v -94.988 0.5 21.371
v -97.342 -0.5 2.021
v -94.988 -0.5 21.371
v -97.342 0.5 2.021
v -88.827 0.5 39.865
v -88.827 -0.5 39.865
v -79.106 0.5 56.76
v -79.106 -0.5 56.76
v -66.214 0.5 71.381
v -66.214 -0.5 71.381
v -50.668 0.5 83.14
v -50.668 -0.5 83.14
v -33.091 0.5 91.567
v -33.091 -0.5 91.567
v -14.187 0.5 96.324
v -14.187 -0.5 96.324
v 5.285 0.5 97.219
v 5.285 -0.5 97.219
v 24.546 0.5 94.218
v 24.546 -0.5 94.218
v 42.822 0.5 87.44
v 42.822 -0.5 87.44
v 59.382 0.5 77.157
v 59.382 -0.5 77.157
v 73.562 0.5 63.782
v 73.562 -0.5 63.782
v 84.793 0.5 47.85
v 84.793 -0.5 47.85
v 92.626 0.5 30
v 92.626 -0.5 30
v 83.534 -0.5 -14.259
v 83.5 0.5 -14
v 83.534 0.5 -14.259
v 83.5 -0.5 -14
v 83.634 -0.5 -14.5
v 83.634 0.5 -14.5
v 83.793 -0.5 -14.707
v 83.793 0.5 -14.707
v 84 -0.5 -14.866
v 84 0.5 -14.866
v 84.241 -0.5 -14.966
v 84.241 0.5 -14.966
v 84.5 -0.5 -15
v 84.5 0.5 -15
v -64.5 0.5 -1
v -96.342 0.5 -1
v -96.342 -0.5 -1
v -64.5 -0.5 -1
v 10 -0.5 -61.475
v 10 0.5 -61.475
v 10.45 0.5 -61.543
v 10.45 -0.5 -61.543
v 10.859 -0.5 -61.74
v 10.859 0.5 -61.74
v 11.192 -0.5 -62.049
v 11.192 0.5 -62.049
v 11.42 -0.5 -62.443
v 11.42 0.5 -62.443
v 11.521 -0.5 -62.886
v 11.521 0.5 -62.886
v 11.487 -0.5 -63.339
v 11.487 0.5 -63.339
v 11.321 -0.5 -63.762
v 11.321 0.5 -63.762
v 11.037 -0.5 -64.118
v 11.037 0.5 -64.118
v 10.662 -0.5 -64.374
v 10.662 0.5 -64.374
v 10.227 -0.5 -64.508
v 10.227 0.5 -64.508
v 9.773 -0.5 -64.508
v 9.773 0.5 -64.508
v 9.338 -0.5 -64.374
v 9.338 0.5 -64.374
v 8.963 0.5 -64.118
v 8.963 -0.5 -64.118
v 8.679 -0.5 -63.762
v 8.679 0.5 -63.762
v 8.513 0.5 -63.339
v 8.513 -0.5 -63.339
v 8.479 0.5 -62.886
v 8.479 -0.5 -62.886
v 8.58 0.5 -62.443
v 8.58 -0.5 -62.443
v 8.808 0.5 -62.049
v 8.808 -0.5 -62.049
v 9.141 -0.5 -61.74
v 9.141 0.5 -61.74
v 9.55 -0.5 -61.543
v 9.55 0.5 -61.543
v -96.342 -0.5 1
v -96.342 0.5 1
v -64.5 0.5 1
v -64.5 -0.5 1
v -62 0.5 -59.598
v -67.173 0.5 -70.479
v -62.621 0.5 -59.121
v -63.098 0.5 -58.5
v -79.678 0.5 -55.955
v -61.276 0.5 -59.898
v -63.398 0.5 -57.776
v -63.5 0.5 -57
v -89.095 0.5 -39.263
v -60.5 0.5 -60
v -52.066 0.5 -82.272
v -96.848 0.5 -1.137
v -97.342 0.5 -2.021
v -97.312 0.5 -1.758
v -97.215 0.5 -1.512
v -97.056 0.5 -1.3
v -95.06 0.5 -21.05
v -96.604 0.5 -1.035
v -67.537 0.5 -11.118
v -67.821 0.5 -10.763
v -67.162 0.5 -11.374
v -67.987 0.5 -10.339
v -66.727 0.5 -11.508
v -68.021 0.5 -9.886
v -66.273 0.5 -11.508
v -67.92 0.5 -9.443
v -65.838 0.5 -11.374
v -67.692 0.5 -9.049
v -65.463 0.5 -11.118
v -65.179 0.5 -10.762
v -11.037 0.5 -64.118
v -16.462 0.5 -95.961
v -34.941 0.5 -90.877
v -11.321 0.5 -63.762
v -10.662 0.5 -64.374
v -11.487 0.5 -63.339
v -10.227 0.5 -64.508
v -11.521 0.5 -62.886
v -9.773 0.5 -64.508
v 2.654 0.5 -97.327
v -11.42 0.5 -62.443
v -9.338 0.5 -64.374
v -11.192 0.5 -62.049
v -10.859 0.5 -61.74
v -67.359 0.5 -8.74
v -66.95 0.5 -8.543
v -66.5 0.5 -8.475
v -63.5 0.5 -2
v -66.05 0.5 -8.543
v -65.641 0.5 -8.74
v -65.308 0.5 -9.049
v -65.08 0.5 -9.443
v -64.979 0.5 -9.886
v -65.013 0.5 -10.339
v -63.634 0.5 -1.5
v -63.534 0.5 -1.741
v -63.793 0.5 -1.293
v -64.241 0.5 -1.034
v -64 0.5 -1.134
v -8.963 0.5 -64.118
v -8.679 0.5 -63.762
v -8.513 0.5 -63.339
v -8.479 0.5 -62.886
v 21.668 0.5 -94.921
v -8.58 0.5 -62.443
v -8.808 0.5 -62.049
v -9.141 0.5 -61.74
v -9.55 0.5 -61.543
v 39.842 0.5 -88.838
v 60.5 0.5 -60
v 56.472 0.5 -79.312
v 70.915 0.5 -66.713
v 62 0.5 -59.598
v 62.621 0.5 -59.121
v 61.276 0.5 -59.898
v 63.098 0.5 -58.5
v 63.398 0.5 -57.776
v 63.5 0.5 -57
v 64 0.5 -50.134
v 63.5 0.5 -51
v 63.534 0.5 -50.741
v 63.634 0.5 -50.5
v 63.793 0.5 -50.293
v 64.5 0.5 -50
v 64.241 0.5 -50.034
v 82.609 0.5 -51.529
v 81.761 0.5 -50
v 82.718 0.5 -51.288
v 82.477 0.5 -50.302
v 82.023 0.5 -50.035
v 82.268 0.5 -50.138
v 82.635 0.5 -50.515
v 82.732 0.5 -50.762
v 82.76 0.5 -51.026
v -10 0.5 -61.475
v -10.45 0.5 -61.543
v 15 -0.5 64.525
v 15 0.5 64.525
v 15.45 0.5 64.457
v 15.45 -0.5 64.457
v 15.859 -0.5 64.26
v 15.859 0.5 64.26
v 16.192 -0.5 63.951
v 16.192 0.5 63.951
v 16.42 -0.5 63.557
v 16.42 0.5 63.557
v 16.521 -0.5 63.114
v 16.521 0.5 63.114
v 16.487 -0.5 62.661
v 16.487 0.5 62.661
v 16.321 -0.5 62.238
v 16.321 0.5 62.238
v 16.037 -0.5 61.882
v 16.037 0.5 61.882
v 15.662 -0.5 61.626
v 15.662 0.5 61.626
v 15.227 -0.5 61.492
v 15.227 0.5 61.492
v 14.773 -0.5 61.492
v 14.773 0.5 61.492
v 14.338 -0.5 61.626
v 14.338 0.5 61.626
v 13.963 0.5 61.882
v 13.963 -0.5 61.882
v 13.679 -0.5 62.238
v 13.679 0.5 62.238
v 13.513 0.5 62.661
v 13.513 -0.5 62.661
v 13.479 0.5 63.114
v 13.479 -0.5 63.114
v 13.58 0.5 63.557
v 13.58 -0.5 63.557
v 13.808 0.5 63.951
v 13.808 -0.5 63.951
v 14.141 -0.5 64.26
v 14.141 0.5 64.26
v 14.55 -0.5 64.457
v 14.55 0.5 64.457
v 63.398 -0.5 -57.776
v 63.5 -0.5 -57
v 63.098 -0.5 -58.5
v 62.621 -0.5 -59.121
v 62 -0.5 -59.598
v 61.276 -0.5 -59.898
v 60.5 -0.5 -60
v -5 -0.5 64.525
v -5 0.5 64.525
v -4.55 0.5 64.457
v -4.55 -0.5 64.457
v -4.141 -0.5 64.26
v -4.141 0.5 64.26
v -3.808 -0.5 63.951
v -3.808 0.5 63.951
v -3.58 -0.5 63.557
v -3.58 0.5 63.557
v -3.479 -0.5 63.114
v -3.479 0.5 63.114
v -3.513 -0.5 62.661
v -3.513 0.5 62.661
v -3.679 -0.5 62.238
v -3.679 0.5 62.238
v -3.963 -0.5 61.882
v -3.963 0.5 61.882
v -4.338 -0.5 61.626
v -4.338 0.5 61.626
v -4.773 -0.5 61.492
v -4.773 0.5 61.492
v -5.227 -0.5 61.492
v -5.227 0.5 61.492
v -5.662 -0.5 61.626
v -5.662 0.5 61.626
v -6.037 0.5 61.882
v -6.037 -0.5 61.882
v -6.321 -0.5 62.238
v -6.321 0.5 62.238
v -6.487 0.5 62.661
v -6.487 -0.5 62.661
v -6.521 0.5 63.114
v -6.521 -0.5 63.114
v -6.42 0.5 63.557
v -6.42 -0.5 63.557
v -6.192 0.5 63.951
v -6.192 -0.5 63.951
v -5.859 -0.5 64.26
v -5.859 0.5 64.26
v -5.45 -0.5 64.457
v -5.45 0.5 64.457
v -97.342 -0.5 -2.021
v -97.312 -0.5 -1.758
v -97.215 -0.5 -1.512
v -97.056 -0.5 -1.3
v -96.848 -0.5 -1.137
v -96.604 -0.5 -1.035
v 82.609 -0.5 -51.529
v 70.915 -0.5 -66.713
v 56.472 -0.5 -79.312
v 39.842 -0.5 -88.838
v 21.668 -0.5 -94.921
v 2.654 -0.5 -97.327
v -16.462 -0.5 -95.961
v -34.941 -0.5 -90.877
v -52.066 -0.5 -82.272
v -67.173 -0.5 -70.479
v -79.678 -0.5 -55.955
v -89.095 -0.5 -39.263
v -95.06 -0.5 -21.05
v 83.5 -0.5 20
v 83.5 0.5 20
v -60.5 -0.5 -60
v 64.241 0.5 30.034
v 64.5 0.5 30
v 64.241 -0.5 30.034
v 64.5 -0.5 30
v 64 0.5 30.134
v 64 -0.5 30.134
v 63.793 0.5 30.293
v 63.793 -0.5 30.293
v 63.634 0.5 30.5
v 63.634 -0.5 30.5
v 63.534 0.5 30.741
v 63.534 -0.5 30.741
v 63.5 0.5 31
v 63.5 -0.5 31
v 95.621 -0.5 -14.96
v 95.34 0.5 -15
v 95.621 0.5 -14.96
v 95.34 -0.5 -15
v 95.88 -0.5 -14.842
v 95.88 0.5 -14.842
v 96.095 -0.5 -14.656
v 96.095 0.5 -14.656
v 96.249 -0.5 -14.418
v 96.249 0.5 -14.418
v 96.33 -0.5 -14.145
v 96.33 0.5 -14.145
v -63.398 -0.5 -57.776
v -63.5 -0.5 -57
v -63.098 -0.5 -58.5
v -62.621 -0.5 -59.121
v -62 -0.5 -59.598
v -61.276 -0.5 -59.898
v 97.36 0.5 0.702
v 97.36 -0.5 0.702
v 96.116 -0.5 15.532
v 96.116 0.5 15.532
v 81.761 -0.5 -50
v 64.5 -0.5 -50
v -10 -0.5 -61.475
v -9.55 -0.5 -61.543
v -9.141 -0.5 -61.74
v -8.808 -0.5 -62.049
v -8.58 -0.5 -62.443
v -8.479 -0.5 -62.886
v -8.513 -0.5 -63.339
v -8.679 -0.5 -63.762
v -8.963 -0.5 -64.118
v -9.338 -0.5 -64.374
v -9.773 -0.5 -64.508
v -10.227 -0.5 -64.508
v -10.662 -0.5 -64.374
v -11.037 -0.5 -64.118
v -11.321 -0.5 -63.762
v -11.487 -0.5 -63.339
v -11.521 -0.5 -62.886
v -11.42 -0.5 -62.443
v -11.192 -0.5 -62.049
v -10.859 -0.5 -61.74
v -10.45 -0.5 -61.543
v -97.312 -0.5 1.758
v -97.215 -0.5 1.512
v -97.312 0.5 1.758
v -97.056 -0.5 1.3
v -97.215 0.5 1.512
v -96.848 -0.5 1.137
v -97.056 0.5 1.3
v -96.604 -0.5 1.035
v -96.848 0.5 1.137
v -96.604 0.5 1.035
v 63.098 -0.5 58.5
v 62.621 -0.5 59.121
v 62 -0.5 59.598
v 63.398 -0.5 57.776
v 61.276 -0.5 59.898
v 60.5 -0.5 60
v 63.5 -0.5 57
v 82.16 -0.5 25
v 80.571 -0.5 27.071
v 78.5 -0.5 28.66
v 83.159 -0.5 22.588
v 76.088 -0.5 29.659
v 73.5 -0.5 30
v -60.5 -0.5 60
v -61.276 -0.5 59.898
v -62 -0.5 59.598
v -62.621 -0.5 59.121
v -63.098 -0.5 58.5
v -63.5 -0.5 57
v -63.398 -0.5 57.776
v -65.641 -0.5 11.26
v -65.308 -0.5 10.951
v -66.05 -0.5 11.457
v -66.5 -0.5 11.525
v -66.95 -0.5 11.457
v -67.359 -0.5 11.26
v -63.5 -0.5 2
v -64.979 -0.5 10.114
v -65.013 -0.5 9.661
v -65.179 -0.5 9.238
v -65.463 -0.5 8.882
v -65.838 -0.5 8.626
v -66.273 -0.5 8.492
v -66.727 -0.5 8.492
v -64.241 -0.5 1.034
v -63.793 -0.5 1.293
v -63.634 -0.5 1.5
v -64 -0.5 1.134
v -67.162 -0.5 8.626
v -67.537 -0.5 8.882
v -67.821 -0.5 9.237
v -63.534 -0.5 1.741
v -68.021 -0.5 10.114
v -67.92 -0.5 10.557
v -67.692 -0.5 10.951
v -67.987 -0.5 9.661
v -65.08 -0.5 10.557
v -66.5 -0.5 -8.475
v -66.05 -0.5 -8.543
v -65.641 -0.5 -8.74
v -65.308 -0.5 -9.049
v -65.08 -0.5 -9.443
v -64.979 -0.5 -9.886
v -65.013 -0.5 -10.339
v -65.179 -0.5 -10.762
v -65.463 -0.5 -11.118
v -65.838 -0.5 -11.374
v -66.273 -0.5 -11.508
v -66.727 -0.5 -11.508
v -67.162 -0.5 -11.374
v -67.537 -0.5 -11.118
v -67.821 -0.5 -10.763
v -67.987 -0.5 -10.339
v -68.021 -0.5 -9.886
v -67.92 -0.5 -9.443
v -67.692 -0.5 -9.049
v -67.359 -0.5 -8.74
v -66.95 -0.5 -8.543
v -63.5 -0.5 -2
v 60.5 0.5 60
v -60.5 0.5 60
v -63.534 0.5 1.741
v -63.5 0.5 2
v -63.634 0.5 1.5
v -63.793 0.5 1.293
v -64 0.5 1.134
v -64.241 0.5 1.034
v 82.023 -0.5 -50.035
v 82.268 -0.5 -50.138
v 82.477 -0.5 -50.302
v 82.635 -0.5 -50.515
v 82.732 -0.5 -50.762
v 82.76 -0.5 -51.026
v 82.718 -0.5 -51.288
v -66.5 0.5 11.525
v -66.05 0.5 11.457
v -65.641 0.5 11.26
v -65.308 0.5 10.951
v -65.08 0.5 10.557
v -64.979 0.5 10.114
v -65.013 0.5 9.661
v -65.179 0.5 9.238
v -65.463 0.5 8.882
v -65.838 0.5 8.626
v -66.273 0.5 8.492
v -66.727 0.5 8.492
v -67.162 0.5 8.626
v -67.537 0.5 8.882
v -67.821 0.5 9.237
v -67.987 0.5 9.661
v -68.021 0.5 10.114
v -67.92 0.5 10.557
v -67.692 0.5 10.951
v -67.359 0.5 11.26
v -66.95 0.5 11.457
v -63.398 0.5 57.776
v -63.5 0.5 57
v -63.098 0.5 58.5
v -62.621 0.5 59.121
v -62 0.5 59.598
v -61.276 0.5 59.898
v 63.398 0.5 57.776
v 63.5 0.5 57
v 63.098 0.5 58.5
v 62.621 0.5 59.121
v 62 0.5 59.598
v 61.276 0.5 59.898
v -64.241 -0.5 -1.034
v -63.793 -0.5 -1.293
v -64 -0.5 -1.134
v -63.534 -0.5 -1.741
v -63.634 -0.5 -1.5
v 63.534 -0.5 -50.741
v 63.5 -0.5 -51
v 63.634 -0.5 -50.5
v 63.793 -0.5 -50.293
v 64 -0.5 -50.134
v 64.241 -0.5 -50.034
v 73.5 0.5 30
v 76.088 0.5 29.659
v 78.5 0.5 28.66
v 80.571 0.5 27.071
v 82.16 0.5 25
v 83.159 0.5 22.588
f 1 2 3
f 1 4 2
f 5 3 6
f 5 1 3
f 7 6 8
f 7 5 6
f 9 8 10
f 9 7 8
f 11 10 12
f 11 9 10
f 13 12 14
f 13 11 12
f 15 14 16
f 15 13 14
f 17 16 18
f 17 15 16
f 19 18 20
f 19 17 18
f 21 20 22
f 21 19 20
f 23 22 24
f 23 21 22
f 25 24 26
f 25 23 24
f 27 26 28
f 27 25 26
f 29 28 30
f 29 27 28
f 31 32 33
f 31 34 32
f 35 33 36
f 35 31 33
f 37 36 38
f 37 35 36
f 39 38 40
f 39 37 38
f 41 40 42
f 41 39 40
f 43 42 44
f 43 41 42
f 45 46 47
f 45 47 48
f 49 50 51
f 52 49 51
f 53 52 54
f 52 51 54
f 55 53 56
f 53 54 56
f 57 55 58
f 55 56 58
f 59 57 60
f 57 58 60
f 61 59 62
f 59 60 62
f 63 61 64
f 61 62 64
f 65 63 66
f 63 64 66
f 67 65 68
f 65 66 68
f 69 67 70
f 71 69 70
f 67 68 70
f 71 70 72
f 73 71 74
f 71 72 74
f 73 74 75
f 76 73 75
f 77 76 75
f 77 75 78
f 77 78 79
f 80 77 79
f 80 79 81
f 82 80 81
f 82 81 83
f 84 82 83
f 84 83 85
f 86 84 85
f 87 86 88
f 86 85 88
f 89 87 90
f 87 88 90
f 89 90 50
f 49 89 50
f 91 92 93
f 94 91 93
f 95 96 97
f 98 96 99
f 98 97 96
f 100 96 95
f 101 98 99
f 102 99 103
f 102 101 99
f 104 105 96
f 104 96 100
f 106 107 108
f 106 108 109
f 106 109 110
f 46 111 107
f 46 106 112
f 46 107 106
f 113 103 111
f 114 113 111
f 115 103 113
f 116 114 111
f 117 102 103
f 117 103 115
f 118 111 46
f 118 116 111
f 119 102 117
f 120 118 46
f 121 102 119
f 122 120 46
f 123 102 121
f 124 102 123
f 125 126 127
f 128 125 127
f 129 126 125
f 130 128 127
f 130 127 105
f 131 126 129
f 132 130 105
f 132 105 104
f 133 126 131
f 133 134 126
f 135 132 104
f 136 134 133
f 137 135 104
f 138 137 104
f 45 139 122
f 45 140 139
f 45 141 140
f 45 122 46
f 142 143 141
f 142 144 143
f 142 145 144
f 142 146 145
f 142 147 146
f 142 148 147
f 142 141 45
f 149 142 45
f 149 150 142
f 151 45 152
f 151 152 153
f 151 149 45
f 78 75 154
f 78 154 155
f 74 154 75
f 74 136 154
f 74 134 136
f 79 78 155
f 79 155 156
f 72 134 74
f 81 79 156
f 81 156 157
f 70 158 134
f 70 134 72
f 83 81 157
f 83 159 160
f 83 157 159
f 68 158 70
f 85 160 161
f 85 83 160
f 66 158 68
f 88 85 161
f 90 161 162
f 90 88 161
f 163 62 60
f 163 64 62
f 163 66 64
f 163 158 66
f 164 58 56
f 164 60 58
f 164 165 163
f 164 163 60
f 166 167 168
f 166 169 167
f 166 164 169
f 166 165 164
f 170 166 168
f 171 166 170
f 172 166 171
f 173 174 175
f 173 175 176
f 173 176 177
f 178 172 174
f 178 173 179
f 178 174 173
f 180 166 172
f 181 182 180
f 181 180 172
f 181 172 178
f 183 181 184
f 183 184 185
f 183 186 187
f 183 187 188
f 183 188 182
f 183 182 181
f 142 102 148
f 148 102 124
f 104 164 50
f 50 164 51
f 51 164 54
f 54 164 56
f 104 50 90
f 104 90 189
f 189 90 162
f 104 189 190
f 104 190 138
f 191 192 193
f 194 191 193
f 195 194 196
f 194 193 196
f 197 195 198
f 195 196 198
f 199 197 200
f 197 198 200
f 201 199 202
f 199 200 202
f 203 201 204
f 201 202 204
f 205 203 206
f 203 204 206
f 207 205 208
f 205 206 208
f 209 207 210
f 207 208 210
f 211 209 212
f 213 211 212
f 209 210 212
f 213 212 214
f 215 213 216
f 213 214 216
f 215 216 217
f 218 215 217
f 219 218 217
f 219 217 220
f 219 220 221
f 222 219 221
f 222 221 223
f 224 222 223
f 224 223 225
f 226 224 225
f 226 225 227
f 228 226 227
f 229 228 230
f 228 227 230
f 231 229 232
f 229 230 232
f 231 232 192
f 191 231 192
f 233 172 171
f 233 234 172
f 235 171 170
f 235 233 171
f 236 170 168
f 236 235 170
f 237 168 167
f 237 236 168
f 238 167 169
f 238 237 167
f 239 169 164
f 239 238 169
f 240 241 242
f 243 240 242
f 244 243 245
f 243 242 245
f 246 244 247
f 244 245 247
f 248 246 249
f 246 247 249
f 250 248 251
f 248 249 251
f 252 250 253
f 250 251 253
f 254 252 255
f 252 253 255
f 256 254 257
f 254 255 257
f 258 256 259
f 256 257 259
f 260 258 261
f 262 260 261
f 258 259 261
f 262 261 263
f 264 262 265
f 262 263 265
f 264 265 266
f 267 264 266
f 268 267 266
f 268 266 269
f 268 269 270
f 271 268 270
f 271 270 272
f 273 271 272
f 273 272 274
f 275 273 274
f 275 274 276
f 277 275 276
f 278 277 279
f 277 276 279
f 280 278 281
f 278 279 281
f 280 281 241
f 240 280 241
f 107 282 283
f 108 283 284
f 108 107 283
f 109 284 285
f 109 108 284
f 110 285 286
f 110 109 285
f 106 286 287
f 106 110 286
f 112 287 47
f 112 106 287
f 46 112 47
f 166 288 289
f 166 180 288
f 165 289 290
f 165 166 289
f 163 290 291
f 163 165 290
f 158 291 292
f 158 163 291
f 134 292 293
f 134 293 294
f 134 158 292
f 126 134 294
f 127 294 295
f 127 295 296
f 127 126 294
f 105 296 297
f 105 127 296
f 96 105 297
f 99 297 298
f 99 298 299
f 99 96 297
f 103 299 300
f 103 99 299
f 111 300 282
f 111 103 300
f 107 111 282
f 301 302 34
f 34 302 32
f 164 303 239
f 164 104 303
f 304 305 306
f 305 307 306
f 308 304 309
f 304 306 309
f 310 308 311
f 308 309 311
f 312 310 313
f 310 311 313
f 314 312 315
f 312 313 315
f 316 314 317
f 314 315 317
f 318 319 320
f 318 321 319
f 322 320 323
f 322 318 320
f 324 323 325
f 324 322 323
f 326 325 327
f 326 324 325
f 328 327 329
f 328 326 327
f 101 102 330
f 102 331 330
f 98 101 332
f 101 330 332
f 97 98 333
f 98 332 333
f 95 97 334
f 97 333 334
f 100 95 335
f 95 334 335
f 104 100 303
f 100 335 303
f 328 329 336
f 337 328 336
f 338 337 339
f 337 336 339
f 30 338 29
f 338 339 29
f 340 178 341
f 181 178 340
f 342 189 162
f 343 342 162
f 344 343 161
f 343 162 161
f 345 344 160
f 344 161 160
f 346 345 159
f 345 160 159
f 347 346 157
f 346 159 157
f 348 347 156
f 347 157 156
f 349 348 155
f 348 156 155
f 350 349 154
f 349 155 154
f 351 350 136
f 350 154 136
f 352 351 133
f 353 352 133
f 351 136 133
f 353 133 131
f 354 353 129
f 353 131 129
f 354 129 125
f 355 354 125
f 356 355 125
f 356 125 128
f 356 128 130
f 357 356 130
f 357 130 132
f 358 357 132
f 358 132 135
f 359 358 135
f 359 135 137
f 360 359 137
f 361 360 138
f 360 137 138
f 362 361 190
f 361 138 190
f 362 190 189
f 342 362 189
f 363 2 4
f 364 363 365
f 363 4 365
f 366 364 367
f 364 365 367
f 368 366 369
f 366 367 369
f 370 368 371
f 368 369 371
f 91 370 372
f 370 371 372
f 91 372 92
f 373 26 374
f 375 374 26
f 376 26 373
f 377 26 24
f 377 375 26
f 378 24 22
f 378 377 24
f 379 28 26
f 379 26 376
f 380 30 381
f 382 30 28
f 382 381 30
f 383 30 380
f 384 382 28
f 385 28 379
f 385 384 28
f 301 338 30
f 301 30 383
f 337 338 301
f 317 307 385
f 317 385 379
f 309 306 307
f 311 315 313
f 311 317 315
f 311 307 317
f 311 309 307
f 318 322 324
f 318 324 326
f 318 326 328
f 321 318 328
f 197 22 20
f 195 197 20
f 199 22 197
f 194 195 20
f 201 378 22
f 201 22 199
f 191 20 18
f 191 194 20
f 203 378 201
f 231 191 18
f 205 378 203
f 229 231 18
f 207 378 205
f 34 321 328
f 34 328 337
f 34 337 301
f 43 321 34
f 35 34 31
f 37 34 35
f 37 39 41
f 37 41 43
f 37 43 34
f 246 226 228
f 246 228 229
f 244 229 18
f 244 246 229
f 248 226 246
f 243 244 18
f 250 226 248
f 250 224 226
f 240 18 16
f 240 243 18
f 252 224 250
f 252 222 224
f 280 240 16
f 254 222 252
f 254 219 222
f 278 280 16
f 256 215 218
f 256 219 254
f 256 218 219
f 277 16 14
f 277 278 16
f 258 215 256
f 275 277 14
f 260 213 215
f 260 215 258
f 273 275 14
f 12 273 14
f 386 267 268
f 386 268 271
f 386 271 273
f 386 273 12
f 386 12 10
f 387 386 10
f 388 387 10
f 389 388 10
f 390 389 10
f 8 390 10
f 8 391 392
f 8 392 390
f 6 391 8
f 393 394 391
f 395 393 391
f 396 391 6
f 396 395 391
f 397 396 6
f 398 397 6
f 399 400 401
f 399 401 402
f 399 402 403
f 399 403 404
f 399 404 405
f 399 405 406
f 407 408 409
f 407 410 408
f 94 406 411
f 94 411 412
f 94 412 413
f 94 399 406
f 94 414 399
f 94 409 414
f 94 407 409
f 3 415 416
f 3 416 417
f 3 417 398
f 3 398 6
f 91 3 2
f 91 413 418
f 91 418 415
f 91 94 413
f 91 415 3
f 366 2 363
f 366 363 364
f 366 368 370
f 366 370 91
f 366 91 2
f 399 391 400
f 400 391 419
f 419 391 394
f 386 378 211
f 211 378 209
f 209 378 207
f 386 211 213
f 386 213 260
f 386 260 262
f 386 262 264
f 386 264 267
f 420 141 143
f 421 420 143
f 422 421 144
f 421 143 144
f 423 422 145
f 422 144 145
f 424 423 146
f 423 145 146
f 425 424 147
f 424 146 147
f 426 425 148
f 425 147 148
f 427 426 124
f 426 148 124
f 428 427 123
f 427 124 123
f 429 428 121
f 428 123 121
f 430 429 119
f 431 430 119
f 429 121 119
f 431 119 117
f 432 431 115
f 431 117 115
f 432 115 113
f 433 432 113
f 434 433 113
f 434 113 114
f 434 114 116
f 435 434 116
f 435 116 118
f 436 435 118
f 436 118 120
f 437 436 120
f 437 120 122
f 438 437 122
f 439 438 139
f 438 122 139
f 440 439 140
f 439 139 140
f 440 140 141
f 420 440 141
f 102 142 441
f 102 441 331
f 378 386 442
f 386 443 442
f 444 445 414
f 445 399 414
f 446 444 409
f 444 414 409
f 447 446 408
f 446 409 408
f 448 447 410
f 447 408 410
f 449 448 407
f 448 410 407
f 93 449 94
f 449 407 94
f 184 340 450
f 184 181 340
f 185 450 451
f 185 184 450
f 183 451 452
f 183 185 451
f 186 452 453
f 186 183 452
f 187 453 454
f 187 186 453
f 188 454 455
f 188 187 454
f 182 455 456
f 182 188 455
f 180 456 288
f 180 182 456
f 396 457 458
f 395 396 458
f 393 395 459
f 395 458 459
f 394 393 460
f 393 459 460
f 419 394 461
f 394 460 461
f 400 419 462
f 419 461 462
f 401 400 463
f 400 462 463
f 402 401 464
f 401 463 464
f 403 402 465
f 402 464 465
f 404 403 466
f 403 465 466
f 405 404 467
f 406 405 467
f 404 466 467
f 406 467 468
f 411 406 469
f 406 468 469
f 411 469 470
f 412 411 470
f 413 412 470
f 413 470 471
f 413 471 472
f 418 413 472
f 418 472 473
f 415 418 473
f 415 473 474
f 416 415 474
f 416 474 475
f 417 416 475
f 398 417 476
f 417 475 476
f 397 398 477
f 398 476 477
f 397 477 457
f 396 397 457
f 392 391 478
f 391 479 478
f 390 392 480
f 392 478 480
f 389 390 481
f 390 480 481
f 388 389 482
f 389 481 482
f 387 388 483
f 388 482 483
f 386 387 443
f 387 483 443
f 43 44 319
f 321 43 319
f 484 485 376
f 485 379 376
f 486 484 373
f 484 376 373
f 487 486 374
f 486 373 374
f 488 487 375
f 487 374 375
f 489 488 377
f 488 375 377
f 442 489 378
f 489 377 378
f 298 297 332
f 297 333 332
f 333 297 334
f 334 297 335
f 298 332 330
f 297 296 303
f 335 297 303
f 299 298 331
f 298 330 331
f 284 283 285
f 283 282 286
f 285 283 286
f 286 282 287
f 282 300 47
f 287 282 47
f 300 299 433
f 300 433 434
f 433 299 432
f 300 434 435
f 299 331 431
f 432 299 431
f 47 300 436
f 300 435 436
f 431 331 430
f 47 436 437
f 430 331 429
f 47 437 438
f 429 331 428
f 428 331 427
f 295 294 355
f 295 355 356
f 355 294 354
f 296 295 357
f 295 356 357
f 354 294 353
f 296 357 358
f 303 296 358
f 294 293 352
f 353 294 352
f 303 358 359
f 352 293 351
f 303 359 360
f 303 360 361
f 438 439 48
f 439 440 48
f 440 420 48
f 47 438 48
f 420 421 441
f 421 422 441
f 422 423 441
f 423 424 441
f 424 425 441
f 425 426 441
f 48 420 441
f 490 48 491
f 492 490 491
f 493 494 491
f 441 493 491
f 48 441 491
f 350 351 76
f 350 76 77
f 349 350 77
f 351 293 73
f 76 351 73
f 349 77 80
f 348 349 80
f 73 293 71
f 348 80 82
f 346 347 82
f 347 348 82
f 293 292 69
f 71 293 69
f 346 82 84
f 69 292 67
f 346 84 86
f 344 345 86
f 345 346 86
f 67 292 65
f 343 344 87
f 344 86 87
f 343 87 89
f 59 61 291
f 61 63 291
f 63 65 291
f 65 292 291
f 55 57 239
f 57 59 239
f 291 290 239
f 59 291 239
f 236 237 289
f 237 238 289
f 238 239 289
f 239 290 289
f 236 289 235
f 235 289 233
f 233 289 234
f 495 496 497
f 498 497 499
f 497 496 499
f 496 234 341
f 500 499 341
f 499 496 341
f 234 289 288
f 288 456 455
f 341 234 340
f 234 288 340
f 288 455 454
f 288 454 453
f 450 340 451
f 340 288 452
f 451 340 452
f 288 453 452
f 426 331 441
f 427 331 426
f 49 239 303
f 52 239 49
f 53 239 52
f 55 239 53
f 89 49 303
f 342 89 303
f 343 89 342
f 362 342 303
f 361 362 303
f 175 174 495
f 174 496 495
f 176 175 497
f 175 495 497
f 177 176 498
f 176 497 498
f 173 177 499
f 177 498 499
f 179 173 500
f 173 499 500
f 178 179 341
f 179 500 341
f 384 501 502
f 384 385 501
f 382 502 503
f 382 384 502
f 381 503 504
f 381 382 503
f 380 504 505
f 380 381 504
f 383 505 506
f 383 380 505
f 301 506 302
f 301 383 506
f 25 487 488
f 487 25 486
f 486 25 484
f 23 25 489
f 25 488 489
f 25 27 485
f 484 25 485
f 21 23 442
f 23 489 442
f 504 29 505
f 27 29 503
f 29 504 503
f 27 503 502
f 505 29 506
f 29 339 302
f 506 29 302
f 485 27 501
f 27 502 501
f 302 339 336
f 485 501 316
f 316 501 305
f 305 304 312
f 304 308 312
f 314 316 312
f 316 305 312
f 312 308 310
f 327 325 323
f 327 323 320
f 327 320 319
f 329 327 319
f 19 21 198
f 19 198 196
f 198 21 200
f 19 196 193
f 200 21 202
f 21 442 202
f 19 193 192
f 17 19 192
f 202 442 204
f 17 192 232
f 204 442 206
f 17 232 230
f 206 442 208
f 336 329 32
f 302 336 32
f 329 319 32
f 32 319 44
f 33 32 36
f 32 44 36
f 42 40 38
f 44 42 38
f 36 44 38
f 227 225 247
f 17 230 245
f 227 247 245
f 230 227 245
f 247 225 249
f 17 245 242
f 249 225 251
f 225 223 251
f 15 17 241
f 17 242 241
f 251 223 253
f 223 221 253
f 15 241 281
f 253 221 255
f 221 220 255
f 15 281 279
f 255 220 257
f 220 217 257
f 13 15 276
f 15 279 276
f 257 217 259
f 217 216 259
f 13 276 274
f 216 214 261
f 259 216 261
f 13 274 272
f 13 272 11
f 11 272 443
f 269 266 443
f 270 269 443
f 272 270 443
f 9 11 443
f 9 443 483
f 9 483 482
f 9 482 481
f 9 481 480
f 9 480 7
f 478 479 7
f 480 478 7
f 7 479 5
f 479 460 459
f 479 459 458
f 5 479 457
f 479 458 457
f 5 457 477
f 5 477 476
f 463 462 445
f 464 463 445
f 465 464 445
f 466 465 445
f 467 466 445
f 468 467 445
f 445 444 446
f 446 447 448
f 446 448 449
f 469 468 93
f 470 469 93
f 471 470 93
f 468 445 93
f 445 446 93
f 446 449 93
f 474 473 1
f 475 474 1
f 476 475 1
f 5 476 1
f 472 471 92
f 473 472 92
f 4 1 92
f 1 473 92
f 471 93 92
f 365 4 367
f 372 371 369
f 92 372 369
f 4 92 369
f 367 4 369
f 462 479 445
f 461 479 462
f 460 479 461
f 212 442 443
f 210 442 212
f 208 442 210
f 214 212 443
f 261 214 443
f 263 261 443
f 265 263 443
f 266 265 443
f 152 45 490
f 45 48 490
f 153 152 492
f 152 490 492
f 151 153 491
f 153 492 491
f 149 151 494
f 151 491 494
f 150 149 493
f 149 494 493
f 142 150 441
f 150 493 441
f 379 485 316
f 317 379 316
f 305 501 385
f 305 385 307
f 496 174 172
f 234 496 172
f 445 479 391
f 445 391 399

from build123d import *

# Parameters (mm, degrees)
SKETCH_1_R          = 97.362749499
SKETCH_1_W          = 127
SKETCH_1_H          = 120
EXTRUDE_1_DEPTH     = 0.5
CUT_EXTRUDE_1_DEPTH = 16
SKETCH_3_W          = 80
SKETCH_3_H          = 2
CUT_EXTRUDE_2_DEPTH = 11
EXTRUDE_2_DEPTH     = 1
FILLET_1_R          = 3
FILLET_2_R          = 3
FILLET_3_R          = 10
SKETCH_5_R          = 1.525
CUT_EXTRUDE_3_DEPTH = 1
FILLET_4_R          = 1
FILLET_5_R          = 1


with BuildPart() as part:
    # 草图1 → 凸台-拉伸1 (new, symmetric)
    with BuildSketch(Plane(origin=(0, 0, 0), x_dir=(1, 0, 0), z_dir=(0, 1, 0))):
        with Locations(Location((0, 0, 0), (0, 0, 270))):
            Circle(SKETCH_1_R)
        Rectangle(SKETCH_1_W, SKETCH_1_H, mode=Mode.SUBTRACT)
    extrude(amount=EXTRUDE_1_DEPTH, both=True)

    # 草图2 → 切除-拉伸1 (cut, symmetric)
    with BuildSketch(Plane(origin=(0, 0.5, 0), x_dir=(1, 0, 0), z_dir=(0, 1, 0))):
        with BuildLine():
            Line((92.625617353, -30), (63.5, -30))
            Line((63.5, -30), (63.5, 50))
            Line((63.5, 50), (83.543431758, 50))
            ThreePointArc((83.543431758, 50), (96.741322434, 10.982783062), (92.625617353, -30))
        make_face()
    extrude(amount=CUT_EXTRUDE_1_DEPTH, both=True, mode=Mode.SUBTRACT)

    # 草图3 → 切除-拉伸2 (cut, symmetric)
    with BuildSketch(Plane(origin=(0, 0.5, 0), x_dir=(1, 0, 0), z_dir=(0, 1, 0))):
        with Locations((-63.5, 0)):
            Rectangle(SKETCH_3_W, SKETCH_3_H)
    extrude(amount=CUT_EXTRUDE_2_DEPTH, both=True, mode=Mode.SUBTRACT)


with BuildPart() as cut_extrude_2_piece_1:
    # of the separate pieces the step leaves, piece 1, a body of its own (cut_extrude_2_pieces)
    add(part.part.solids().sort_by_distance((92.625617353, -0.5, 30))[0])

    # 草图4 → 凸台-拉伸2 (add)
    with BuildSketch(Plane(origin=(0, 0.5, 0), x_dir=(1, 0, 0), z_dir=(0, 1, 0))):
        with BuildLine():
            Line((83.5, -30), (83.5, 15))
            Line((83.5, 15), (96.200337785, 15))
            ThreePointArc((96.200337785, 15), (97.056995283, -7.710036092), (92.625617353, -30))
            Line((92.625617353, -30), (83.5, -30))
        make_face()
    extrude(amount=-EXTRUDE_2_DEPTH)

    # 圆角1
    fillet_1_edges = [cut_extrude_2_piece_1.edges().sort_by_distance(p)[0] for p in [
        (-63.5, 0, 60),
        (63.5, 0, 60),
    ]]
    fillet(fillet_1_edges, radius=FILLET_1_R)

    # 圆角3
    fillet_3_edges = [cut_extrude_2_piece_1.edges().sort_by_distance(p)[0] for p in [
        (83.5, 0, 30),
    ]]
    fillet(fillet_3_edges, radius=FILLET_3_R)


with BuildPart() as cut_extrude_2_piece_2:
    # of the separate pieces the step leaves, piece 2, a body of its own (cut_extrude_2_pieces)
    add(part.part.solids().sort_by_distance((-97.357613929, -0.5, -1))[0])

    # 圆角2
    fillet_2_edges = [cut_extrude_2_piece_2.edges().sort_by_distance(p)[0] for p in [
        (63.5, 0, -60),
        (-63.5, 0, -60),
    ]]
    fillet(fillet_2_edges, radius=FILLET_2_R)


with BuildPart() as cut_extrude_3_tool:
    # 草图5 → 切除-拉伸3 (new body)
    with BuildSketch(Plane(origin=(0, 0.5, 0), x_dir=(1, 0, 0), z_dir=(0, 1, 0))):
        with Locations(Location((-66.5, 10, 0), (0, 0, 270))):
            Circle(SKETCH_5_R)
        with Locations(Location((-66.5, -10, 0), (0, 0, 270))):
            Circle(SKETCH_5_R)
        with Locations(Location((-10, 63, 0), (0, 0, 270))):
            Circle(SKETCH_5_R)
        with Locations(Location((10, 63, 0), (0, 0, 270))):
            Circle(SKETCH_5_R)
        with Locations(Location((-5, -63, 0), (0, 0, 270))):
            Circle(SKETCH_5_R)
        with Locations(Location((15, -63, 0), (0, 0, 270))):
            Circle(SKETCH_5_R)
    extrude(amount=-CUT_EXTRUDE_3_DEPTH)


with BuildPart() as cut_extrude_2_piece_1_1:
    add(cut_extrude_2_piece_1.part)

    # 切除-拉伸3: cut by cut_extrude_3_tool
    add(cut_extrude_3_tool.part, mode=Mode.SUBTRACT)

    # 圆角4
    fillet_4_edges = [cut_extrude_2_piece_1_1.edges().sort_by_distance(p)[0] for p in [
        (83.5, 0, -15),
        (96.200337785, 0, -15),
        (-97.357613929, 0, 1),
        (63.5, 0, 30),
        (-63.5, 0, 1),
    ]]
    fillet(fillet_4_edges, radius=FILLET_4_R)


with BuildPart() as cut_extrude_2_piece_2_1:
    add(cut_extrude_2_piece_2.part)

    # 切除-拉伸3: cut by cut_extrude_3_tool
    add(cut_extrude_3_tool.part, mode=Mode.SUBTRACT)

    # 圆角5
    fillet_5_edges = [cut_extrude_2_piece_2_1.edges().sort_by_distance(p)[0] for p in [
        (63.5, 0, -50),
        (83.543431758, 0, -50),
        (-63.5, 0, -1),
        (-97.357613929, 0, -1),
    ]]
    fillet(fillet_5_edges, radius=FILLET_5_R)


solid = Compound([cut_extrude_2_piece_1_1.part, cut_extrude_2_piece_2_1.part])
